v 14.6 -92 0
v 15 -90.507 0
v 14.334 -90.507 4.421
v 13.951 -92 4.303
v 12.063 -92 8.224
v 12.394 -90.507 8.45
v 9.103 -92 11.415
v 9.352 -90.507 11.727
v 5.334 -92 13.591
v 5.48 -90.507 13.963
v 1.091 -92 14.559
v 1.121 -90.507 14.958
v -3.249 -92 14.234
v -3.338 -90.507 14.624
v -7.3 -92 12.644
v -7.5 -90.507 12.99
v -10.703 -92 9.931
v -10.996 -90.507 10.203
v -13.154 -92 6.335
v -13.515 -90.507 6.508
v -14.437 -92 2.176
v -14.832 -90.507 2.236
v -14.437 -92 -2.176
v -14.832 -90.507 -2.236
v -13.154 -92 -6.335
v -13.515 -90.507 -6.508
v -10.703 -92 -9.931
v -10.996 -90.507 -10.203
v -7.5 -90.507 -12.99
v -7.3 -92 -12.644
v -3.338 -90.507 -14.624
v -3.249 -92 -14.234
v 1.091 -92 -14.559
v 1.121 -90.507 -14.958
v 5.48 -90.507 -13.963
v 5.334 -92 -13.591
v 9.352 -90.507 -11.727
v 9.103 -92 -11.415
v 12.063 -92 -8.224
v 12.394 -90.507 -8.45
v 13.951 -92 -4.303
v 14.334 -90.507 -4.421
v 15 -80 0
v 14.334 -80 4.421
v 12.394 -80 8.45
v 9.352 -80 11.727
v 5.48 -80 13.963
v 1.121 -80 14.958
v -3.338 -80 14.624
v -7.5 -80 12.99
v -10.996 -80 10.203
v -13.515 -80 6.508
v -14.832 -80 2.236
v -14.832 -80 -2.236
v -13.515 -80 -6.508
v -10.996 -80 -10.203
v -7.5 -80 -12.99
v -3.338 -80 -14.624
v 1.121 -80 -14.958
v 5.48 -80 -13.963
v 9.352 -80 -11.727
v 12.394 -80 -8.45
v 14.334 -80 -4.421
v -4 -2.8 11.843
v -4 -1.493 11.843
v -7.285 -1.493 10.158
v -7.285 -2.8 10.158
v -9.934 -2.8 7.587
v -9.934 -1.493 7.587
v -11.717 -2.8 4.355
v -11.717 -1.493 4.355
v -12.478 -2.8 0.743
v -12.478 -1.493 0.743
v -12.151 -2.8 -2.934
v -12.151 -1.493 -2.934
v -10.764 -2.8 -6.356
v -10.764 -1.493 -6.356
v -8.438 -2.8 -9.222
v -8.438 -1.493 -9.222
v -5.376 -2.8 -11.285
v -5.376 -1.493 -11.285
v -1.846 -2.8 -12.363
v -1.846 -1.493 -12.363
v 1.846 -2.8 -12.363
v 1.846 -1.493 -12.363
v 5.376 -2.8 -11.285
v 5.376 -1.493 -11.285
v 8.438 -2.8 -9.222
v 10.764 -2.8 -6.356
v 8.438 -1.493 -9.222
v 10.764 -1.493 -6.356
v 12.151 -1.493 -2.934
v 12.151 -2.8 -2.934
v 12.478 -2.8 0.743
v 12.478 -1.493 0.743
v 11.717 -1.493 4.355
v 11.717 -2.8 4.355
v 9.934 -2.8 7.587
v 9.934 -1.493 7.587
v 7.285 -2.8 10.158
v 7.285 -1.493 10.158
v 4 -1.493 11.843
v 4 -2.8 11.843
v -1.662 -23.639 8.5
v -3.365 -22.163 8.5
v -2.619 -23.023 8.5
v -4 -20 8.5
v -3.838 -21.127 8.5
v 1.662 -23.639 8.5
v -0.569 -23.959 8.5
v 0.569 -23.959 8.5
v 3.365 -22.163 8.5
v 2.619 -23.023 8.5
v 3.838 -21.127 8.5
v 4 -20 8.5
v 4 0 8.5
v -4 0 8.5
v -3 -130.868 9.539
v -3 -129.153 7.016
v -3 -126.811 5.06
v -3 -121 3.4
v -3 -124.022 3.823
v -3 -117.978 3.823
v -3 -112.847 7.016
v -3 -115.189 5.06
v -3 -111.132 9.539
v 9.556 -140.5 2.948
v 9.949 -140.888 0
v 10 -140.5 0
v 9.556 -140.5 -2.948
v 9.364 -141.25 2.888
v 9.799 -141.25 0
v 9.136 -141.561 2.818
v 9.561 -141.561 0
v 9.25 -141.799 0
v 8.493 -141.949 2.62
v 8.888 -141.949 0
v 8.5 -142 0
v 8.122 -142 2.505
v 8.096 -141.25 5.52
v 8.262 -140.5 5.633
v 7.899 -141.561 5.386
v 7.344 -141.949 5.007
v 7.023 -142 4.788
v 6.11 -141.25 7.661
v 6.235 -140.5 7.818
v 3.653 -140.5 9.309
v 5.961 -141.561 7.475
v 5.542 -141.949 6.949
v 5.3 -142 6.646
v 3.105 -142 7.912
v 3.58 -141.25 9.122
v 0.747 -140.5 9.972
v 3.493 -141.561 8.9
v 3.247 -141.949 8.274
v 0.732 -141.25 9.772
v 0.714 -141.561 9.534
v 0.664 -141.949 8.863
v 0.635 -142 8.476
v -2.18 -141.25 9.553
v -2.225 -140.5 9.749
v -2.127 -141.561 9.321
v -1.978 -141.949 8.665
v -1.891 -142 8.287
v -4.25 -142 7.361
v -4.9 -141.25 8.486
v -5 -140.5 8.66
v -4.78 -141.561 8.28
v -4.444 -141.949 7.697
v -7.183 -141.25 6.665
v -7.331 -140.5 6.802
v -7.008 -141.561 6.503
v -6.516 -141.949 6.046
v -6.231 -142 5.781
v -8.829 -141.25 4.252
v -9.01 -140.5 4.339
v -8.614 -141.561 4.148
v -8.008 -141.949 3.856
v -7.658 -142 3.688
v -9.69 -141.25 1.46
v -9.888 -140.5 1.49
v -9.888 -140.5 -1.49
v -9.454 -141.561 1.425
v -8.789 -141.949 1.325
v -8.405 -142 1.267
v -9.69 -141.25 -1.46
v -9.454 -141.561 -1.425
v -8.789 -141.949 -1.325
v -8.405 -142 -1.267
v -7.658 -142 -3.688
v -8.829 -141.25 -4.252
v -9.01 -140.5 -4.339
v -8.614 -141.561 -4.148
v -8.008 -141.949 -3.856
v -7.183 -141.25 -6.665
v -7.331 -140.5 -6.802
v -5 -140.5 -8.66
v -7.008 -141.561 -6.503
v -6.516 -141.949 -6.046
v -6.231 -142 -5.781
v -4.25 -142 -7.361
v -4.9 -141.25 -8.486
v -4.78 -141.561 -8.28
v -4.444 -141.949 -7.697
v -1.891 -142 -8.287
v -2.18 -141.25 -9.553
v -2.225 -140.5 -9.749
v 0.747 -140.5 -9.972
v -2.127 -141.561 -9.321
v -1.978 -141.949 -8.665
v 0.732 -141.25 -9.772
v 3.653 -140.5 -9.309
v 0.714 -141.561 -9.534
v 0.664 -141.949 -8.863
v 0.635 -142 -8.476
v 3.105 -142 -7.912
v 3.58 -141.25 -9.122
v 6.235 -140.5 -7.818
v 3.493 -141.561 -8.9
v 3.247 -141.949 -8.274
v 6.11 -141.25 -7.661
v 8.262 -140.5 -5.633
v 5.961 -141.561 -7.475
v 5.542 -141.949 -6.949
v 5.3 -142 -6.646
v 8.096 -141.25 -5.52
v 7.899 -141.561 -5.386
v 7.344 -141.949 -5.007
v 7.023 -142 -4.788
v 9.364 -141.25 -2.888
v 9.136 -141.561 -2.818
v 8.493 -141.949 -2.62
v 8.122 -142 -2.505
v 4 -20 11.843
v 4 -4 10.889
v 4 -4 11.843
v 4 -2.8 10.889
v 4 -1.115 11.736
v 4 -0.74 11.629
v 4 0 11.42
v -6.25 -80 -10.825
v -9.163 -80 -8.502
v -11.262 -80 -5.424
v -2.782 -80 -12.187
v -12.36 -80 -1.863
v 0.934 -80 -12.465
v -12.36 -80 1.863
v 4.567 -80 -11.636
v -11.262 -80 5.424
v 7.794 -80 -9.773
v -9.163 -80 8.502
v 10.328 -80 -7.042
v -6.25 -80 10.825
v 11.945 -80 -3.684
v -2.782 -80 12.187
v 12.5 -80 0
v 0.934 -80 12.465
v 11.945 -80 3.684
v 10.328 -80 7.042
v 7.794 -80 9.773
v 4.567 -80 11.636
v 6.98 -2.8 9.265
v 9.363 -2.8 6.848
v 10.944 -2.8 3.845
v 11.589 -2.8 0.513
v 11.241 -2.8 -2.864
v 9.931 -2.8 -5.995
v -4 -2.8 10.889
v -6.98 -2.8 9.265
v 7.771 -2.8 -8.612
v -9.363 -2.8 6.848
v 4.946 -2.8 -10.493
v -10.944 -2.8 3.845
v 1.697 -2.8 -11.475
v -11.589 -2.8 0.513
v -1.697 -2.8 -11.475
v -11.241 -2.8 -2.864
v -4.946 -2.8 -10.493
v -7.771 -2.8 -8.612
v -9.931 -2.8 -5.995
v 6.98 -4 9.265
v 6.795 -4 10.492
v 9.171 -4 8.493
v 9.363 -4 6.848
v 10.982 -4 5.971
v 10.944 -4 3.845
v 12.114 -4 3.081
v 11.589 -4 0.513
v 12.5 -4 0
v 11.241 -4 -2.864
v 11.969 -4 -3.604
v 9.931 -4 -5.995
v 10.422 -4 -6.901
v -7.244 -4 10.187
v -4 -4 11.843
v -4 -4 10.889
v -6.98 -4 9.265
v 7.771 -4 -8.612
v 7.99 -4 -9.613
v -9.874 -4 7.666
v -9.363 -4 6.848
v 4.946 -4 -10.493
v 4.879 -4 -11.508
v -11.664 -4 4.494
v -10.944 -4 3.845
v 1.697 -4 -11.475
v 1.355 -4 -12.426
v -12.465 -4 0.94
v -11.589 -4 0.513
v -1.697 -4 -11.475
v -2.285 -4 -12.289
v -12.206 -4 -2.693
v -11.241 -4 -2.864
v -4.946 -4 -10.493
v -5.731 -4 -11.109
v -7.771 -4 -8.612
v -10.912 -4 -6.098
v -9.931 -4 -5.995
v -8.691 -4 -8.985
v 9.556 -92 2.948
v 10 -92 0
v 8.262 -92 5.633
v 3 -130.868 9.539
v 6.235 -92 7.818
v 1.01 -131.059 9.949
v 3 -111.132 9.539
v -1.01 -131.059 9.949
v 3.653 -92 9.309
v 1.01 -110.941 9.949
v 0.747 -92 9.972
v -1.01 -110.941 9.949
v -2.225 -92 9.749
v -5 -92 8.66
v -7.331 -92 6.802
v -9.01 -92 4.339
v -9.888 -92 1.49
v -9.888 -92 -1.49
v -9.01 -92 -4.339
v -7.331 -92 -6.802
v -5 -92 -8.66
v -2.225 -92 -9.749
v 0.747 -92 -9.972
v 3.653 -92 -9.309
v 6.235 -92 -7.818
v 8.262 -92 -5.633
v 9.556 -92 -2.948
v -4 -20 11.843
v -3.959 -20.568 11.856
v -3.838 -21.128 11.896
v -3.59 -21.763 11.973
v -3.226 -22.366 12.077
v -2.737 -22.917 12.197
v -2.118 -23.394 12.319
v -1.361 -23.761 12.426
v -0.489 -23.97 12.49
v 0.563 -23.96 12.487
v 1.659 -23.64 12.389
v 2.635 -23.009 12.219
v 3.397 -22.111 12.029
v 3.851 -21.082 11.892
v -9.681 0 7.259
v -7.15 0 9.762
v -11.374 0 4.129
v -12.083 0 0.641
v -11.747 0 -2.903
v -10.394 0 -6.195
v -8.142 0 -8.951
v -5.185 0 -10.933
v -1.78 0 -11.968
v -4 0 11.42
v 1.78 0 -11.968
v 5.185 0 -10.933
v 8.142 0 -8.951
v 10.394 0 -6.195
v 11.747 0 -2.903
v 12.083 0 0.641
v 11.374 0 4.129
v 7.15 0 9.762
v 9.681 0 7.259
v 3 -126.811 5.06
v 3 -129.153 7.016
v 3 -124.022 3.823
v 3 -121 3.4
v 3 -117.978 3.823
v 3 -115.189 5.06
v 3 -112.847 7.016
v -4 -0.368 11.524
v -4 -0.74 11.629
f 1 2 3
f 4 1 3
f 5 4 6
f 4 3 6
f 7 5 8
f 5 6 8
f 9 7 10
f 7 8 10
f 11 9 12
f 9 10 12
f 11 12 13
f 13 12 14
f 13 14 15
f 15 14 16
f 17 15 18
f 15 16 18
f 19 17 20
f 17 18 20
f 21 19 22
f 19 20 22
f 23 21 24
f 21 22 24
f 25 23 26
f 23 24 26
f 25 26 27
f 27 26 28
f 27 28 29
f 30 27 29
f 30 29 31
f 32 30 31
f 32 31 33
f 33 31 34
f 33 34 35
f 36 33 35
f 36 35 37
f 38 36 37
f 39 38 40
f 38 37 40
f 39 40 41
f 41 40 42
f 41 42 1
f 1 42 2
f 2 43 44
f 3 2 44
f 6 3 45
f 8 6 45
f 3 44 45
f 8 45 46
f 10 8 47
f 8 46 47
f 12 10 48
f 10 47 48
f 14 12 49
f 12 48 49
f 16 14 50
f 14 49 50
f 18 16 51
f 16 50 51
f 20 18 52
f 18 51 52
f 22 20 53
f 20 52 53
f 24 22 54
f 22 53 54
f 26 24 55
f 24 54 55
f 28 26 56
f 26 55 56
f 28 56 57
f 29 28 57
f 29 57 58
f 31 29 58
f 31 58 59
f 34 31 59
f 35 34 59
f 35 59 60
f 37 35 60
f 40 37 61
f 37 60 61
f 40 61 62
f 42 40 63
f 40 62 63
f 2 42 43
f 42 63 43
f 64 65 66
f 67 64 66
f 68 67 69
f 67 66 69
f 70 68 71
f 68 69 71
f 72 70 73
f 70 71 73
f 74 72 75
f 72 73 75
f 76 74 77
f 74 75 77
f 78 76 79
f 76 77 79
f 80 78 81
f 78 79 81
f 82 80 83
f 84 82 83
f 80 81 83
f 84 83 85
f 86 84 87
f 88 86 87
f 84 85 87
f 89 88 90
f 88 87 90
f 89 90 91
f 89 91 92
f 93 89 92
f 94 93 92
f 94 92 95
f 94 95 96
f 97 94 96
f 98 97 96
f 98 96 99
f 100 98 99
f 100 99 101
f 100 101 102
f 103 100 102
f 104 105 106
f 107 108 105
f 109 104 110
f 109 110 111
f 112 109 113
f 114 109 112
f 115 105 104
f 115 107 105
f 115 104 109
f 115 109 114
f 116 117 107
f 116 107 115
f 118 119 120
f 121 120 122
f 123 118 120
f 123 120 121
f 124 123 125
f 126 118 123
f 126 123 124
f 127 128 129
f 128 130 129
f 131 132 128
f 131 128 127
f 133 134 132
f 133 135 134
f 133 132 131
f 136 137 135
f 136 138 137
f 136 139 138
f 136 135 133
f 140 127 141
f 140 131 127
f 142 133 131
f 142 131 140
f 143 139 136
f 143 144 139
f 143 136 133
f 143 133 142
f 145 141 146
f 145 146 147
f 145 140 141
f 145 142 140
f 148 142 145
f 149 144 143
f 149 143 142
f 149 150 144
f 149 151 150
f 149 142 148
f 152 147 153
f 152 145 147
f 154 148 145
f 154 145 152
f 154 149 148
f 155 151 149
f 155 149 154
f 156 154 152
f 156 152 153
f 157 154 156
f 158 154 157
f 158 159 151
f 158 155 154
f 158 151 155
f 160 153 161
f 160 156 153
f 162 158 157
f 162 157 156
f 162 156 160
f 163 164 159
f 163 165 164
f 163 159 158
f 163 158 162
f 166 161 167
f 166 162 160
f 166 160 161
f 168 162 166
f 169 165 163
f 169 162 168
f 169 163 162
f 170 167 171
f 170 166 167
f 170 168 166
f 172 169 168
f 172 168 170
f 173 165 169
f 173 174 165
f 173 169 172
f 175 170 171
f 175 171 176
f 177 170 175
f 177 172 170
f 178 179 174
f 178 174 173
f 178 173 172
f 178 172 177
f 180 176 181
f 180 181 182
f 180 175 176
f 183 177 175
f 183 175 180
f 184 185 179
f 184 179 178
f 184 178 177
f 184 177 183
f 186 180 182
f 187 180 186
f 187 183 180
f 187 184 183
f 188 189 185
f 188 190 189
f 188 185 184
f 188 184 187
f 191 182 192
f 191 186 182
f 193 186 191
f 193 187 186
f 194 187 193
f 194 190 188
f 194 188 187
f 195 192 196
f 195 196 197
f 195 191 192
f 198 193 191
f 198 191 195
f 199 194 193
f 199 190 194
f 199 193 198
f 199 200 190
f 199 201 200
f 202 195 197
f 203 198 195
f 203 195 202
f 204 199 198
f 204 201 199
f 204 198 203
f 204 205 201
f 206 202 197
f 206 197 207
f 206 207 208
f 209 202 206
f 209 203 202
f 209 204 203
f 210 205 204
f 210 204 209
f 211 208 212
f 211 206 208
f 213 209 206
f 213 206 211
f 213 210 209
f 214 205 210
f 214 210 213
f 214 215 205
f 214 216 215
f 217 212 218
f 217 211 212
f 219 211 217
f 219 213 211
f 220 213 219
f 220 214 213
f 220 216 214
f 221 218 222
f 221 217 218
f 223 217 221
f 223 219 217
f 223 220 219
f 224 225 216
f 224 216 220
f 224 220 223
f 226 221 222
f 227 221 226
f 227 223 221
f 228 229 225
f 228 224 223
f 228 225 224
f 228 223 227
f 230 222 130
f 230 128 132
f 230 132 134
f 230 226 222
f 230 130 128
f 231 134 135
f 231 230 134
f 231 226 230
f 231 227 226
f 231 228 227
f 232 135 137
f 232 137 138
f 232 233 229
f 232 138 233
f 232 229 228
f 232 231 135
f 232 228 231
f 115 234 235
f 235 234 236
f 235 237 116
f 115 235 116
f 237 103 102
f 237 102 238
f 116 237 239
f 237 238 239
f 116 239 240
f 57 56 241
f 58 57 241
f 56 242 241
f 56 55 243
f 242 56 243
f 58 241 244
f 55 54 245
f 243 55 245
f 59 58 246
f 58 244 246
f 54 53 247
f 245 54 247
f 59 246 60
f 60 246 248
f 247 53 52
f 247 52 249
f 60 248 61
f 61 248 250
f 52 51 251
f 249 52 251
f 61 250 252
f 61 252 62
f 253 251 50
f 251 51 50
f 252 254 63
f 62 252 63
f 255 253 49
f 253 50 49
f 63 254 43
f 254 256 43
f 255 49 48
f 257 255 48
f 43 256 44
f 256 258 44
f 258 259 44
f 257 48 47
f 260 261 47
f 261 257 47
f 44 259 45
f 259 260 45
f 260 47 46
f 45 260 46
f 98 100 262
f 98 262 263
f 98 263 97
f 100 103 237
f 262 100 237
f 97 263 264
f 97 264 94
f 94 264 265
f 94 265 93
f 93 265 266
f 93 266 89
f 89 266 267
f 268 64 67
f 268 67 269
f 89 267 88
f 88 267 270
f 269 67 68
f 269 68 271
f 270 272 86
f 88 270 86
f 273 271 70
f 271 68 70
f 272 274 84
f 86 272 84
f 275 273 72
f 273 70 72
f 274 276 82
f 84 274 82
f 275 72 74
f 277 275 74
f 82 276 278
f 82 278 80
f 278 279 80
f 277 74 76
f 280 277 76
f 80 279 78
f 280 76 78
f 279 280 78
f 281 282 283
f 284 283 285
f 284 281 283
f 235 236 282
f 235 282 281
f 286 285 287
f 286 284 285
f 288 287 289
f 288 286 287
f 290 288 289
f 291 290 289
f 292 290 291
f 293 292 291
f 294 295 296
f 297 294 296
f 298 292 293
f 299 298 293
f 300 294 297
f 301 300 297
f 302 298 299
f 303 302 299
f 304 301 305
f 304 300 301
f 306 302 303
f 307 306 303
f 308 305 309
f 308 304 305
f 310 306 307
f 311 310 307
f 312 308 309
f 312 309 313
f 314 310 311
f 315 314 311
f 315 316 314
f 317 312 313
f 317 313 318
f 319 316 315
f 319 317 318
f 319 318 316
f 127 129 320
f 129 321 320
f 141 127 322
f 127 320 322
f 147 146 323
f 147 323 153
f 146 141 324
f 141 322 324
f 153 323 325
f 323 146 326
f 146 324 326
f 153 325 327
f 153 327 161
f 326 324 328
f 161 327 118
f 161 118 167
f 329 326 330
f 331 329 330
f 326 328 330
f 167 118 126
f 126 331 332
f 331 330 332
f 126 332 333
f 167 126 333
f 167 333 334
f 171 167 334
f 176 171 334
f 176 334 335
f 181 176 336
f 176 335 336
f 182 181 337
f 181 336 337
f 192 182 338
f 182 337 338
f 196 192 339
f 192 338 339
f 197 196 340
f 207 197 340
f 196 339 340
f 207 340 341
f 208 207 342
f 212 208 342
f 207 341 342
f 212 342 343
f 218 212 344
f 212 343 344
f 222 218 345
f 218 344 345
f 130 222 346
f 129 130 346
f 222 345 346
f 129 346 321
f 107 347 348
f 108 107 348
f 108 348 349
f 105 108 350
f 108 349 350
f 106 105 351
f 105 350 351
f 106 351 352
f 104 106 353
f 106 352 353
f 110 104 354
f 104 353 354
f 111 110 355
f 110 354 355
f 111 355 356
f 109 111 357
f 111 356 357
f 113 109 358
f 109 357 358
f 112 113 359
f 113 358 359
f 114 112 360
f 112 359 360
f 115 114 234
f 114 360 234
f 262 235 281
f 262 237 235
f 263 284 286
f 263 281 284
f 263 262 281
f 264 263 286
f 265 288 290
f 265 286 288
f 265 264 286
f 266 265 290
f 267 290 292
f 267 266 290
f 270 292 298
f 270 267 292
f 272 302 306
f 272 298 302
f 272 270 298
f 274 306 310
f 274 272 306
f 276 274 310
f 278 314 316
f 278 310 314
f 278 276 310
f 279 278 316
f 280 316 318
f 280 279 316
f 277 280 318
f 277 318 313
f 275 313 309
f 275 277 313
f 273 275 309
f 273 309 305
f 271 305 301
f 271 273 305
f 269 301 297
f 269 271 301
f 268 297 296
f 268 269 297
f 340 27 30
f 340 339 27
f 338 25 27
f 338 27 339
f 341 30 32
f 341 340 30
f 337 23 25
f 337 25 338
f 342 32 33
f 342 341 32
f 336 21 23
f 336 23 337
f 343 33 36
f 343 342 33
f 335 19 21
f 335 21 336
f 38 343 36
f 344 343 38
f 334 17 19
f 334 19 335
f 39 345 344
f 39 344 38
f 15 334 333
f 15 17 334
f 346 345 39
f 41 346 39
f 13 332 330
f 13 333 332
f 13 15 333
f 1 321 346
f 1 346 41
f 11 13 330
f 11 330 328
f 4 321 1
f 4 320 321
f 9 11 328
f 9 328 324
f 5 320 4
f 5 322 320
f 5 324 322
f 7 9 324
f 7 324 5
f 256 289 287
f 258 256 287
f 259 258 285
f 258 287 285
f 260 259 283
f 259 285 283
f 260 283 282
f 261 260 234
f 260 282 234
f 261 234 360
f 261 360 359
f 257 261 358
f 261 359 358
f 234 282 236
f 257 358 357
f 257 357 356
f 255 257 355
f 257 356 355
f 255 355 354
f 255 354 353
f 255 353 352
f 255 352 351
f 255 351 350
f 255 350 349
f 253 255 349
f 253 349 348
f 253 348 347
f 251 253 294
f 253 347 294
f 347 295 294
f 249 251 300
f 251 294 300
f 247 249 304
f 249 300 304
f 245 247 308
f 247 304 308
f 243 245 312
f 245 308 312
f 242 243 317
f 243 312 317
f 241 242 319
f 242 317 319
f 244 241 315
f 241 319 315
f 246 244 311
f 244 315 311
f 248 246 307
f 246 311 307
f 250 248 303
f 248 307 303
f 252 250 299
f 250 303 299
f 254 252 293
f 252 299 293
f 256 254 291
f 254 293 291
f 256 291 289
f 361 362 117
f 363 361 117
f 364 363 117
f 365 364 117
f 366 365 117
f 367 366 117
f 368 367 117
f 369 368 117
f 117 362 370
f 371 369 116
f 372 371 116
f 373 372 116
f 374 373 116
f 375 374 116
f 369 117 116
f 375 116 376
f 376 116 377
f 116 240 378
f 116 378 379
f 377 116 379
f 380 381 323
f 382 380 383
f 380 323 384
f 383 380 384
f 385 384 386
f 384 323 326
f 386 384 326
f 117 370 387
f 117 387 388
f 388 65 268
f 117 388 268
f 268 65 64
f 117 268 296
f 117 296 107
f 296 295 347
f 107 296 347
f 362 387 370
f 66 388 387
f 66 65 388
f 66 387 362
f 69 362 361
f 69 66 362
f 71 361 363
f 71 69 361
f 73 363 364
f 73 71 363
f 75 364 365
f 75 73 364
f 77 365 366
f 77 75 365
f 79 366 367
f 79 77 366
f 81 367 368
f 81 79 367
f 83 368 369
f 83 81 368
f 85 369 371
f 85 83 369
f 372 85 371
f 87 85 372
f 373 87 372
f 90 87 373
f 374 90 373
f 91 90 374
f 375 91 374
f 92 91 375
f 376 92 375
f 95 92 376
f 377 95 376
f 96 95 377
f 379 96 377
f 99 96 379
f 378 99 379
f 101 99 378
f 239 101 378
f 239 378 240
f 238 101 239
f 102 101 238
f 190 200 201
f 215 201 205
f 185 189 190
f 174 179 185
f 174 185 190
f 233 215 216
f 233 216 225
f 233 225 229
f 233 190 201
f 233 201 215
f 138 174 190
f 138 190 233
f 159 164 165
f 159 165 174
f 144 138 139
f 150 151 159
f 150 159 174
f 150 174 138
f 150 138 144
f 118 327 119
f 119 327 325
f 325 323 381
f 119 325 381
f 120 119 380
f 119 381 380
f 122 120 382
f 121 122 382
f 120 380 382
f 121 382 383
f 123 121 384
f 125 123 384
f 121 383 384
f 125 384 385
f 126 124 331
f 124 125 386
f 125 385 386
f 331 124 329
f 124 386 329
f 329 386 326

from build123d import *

# Parameters (mm, degrees)
F0_R      = 12.5
F1_DEPTH  = 80
F2_R      = 15
F3_DEPTH  = 12
F4_R      = 10
F5_DEPTH  = 50
F6_SIZE2  = 1.492820323
F6_SIZE   = 0.4
F7_SIZE2  = 1.492820323
F7_SIZE   = 0.4
F8_R      = 1.5
F11_DEPTH = 4
F12_W     = 1.2
F12_H     = 0.9
F14_R     = 11
F15_DEPTH = 3


with BuildPart() as f1:
    # F0 (on Front) → F1 (new body)
    with BuildSketch(Plane.XZ):
        Circle(F0_R)
    extrude(amount=F1_DEPTH)

    # F2 (on face) → F3 (join)
    with BuildSketch(Plane.XZ.offset(80)):
        Circle(F2_R)
    extrude(amount=F3_DEPTH)

    # F4 (on face) → F5 (join)
    with BuildSketch(Plane.XZ.offset(92)):
        Circle(F4_R)
    extrude(amount=F5_DEPTH)

    # F6
    f6_edges = [f1.edges().sort_by_distance(p)[0] for p in [
        (-12.5, 0, 0),
    ]]
    f6_side = f1.faces().sort_by_distance((0, 0, 0))[0]
    chamfer(f6_edges, length=F6_SIZE, length2=F6_SIZE2, reference=f6_side)

    # F7
    f7_edges = [f1.edges().sort_by_distance(p)[0] for p in [
        (-15, -92, 0),
    ]]
    f7_side = f1.faces().sort_by_distance((-14.575736, -92, 0))[0]
    chamfer(f7_edges, length=F7_SIZE, length2=F7_SIZE2, reference=f7_side)

    # F8
    f8_edges = [f1.edges().sort_by_distance(p)[0] for p in [
        (-10, -142, 0),
    ]]
    fillet(f8_edges, radius=F8_R)

    # F10 (on offset) → F11 (cut)
    with BuildSketch(Plane.XY.offset(12.5)):
        with BuildLine():
            Line((-4, 31.7779608309), (-4, -20))
            ThreePointArc((-4, -20), (0, -24), (4, -20))
            Line((4, -20), (4, 31.7779608309))
            Line((4, 31.7779608309), (-4, 31.7779608309))
        make_face()
    extrude(amount=-F11_DEPTH, mode=Mode.SUBTRACT)

    # F12 (on Right) → F13 (revolve, cut)
    with BuildSketch(Plane.YZ):
        with Locations((-3.4, -12.05)):
            Rectangle(F12_W, F12_H)
    revolve(axis=Axis((0, 0, 0), (0, 1, 0)), mode=Mode.SUBTRACT)

    # F14 (on Right) → F15 (cut, symmetric)
    with BuildSketch(Plane.YZ):
        with Locations((-121, 14.4)):
            Circle(F14_R)
    extrude(amount=F15_DEPTH, both=True, mode=Mode.SUBTRACT)


solid = f1.part
